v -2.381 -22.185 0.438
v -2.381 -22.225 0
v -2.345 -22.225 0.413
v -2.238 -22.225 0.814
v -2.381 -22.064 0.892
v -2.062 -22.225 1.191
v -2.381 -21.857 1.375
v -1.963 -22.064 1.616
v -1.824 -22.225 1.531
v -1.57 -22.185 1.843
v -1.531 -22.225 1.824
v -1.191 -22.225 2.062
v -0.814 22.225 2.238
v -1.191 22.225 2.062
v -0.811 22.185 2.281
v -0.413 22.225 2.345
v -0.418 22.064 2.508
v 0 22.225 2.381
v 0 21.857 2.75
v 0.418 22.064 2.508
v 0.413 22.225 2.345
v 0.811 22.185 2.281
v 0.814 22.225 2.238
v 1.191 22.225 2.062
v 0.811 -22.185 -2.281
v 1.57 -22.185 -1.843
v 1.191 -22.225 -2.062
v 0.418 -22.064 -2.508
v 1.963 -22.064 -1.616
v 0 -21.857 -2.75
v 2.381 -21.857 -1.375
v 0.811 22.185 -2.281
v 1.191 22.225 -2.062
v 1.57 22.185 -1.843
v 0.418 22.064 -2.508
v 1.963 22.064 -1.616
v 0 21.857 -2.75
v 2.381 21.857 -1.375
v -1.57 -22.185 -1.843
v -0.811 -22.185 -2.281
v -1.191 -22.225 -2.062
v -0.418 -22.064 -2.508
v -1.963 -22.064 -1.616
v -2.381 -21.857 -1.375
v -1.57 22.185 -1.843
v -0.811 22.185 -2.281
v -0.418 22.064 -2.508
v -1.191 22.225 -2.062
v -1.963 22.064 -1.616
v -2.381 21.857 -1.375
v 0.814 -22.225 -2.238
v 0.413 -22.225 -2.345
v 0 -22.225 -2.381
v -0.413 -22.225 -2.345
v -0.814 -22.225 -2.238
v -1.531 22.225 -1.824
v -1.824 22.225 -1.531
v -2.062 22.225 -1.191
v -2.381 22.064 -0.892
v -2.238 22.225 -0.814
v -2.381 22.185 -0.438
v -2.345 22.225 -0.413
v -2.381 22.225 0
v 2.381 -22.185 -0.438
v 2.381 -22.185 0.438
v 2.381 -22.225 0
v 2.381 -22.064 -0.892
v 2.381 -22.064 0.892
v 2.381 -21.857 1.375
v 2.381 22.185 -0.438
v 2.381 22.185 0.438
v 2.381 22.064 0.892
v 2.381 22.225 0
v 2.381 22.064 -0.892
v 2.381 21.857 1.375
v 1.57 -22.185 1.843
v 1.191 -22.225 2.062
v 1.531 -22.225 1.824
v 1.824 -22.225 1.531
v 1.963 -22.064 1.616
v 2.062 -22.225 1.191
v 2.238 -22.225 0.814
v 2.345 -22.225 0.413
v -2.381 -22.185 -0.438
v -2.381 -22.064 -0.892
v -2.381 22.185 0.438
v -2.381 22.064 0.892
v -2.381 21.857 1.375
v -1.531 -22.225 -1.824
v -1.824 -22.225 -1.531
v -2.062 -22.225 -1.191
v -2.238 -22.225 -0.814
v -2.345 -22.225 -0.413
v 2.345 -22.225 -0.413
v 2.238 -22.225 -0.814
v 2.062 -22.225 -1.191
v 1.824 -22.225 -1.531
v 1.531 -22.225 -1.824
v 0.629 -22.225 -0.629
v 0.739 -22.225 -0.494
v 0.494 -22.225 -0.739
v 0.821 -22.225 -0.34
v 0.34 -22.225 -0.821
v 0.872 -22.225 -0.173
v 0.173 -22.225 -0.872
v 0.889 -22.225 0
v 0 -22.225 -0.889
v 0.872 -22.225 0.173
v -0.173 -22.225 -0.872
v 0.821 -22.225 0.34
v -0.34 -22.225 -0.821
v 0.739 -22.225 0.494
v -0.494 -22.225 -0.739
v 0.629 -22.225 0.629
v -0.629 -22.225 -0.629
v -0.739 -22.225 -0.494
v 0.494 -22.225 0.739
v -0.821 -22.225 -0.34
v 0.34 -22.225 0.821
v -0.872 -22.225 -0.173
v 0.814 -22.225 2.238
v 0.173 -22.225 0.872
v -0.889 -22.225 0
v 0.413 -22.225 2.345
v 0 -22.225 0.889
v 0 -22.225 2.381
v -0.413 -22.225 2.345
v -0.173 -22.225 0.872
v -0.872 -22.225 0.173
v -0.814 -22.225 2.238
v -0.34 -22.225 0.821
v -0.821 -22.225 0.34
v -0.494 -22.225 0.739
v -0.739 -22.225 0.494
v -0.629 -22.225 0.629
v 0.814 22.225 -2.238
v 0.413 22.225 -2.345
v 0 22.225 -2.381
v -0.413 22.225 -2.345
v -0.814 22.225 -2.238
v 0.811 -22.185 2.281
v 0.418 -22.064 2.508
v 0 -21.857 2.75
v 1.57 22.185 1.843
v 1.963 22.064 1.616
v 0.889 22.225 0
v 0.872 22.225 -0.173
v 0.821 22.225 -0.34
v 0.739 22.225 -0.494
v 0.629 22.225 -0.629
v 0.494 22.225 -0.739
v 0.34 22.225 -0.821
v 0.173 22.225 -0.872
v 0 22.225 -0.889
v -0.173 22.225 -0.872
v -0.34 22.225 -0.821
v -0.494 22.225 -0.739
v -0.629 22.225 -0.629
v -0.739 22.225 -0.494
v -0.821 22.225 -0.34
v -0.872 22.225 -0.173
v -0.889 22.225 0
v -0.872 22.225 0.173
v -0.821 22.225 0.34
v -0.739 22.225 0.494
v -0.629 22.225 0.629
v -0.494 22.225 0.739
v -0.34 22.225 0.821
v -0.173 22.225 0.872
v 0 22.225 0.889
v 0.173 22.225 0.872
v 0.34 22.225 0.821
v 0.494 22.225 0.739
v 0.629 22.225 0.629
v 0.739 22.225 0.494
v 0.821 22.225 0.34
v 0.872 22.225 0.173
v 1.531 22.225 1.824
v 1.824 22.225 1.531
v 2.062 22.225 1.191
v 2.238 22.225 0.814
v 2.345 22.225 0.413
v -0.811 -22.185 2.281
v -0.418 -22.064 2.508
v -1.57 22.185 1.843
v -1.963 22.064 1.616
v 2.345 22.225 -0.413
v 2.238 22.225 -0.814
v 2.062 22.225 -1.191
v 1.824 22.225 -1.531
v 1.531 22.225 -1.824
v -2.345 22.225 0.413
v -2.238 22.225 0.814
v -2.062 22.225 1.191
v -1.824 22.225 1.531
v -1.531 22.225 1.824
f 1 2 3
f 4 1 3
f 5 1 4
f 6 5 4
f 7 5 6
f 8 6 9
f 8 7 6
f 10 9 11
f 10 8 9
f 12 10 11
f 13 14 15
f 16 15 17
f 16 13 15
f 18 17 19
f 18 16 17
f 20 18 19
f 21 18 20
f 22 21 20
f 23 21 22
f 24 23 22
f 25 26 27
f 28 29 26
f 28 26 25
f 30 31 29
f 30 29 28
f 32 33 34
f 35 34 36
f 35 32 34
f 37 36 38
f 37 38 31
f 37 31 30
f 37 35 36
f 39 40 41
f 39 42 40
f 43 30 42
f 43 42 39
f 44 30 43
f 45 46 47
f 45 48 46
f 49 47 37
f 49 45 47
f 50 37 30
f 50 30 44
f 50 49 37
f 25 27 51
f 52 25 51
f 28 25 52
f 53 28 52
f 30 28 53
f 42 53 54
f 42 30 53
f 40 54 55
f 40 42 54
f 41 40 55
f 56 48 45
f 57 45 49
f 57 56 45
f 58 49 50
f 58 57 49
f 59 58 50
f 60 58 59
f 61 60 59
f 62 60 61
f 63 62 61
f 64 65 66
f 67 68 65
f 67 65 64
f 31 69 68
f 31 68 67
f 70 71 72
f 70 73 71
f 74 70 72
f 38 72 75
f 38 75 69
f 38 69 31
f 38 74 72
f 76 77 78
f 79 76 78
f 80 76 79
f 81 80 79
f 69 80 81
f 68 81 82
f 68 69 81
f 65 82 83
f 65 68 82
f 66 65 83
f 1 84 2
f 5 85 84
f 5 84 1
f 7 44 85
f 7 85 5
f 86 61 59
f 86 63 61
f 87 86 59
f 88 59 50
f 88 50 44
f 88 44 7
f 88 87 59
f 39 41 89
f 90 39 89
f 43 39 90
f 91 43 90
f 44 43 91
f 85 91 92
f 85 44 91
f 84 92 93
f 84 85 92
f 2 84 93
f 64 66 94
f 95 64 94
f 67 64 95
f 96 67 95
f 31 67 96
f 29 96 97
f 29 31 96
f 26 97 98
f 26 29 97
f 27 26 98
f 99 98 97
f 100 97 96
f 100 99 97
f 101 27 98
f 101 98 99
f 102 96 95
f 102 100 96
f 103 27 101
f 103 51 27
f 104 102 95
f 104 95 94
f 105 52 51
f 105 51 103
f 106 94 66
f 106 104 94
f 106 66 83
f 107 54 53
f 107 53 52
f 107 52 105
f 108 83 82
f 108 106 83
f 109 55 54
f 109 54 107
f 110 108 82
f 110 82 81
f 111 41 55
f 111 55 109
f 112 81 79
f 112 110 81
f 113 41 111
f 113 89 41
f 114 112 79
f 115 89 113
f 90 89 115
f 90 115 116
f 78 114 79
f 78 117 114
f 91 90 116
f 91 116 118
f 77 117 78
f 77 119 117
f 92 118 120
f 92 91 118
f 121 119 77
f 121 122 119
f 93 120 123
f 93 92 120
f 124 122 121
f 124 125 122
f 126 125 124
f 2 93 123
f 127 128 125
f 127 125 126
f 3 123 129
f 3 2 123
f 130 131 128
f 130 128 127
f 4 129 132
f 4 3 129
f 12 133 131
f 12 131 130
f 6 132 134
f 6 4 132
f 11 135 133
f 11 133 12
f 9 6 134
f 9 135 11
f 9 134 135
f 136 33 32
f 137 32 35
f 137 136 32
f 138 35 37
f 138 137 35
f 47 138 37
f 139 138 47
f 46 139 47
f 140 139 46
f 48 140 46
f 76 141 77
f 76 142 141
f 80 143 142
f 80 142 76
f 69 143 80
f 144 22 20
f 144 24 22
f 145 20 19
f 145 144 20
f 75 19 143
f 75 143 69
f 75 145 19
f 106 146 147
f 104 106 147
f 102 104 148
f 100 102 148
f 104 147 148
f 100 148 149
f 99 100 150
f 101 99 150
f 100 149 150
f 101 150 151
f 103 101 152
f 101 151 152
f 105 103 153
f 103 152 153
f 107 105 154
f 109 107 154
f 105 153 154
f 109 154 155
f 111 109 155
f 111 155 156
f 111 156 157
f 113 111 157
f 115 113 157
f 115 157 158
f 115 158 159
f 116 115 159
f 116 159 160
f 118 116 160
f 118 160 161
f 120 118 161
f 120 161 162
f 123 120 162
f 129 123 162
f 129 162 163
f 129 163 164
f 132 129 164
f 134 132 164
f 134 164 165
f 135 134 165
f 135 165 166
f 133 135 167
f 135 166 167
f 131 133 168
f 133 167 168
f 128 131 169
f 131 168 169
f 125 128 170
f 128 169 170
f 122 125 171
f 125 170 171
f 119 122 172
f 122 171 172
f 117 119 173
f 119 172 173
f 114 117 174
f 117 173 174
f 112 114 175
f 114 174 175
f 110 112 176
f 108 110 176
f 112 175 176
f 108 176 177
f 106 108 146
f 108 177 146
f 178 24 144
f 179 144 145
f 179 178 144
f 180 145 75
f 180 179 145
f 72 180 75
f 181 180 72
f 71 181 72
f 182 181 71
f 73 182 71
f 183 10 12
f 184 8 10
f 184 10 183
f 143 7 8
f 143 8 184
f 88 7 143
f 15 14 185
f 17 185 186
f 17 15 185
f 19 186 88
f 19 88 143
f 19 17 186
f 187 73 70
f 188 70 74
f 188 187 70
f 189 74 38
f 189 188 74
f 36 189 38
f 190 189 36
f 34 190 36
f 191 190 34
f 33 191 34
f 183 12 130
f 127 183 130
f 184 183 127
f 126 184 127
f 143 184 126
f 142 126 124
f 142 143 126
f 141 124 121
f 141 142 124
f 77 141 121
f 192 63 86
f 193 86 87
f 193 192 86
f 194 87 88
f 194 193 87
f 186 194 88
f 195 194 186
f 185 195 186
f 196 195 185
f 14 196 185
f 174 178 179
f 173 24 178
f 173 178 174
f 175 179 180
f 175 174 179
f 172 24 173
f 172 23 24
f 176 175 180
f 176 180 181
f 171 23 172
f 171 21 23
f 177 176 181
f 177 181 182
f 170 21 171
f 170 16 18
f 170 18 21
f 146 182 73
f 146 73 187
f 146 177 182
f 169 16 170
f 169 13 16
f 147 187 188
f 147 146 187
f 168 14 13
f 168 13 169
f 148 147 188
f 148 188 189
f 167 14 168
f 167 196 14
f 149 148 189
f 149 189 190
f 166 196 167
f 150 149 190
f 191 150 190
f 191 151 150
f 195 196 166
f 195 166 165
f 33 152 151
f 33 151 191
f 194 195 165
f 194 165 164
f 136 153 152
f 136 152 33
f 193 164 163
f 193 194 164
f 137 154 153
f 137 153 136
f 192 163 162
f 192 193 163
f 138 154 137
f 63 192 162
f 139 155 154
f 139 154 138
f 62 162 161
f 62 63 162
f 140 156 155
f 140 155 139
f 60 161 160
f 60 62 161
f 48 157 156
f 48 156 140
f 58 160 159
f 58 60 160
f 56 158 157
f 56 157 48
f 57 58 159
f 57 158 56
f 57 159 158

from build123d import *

# Parameters (mm, degrees)
SKETCH5_R             = 3.175
CUT_EXTRUDE1_DEPTH    = 45.676210112
F_2_56_TAPPED_HOLE1_D = 1.778


with BuildPart() as part:
    # Sketch1 → Revolve1 (revolve)
    with BuildSketch(Plane.XY, mode=Mode.PRIVATE) as revolve1_sk:
        Polygon((0, -22.225), (2.38125, -22.225), (3.175, -21.43125), (3.175, 21.43125), (2.38125, 22.225), (0, 22.225), align=None)
    revolve(revolve1_sk.sketch.rotate(Axis((0, -22.225, 0), (0, 1, 0)), 90), axis=Axis((0, -22.225, 0), (0, 1, 0)))

    # Sketch5 → Cut-Extrude1 (cut, through all)
    with BuildSketch(Plane(origin=(0, 22.225, 0), x_dir=(1, 0, 0), z_dir=(0, 1, 0))):
        Circle(SKETCH5_R)
        Polygon((2.38125, -1.374815329), (2.38125, 1.374815329), (0, 2.749630657), (-2.38125, 1.374815329), (-2.38125, -1.374815329), (0, -2.749630657), align=None, mode=Mode.SUBTRACT)
    extrude(amount=-CUT_EXTRUDE1_DEPTH, mode=Mode.SUBTRACT)

    # #2-56 Tapped Hole1 (through all)
    with Locations(Plane(origin=(0, -22.225, 0), x_dir=(-1, 0, 0), z_dir=(0, -1, 0))):
        with Locations((0, 0)):
            Hole(F_2_56_TAPPED_HOLE1_D / 2)


solid = part.part
